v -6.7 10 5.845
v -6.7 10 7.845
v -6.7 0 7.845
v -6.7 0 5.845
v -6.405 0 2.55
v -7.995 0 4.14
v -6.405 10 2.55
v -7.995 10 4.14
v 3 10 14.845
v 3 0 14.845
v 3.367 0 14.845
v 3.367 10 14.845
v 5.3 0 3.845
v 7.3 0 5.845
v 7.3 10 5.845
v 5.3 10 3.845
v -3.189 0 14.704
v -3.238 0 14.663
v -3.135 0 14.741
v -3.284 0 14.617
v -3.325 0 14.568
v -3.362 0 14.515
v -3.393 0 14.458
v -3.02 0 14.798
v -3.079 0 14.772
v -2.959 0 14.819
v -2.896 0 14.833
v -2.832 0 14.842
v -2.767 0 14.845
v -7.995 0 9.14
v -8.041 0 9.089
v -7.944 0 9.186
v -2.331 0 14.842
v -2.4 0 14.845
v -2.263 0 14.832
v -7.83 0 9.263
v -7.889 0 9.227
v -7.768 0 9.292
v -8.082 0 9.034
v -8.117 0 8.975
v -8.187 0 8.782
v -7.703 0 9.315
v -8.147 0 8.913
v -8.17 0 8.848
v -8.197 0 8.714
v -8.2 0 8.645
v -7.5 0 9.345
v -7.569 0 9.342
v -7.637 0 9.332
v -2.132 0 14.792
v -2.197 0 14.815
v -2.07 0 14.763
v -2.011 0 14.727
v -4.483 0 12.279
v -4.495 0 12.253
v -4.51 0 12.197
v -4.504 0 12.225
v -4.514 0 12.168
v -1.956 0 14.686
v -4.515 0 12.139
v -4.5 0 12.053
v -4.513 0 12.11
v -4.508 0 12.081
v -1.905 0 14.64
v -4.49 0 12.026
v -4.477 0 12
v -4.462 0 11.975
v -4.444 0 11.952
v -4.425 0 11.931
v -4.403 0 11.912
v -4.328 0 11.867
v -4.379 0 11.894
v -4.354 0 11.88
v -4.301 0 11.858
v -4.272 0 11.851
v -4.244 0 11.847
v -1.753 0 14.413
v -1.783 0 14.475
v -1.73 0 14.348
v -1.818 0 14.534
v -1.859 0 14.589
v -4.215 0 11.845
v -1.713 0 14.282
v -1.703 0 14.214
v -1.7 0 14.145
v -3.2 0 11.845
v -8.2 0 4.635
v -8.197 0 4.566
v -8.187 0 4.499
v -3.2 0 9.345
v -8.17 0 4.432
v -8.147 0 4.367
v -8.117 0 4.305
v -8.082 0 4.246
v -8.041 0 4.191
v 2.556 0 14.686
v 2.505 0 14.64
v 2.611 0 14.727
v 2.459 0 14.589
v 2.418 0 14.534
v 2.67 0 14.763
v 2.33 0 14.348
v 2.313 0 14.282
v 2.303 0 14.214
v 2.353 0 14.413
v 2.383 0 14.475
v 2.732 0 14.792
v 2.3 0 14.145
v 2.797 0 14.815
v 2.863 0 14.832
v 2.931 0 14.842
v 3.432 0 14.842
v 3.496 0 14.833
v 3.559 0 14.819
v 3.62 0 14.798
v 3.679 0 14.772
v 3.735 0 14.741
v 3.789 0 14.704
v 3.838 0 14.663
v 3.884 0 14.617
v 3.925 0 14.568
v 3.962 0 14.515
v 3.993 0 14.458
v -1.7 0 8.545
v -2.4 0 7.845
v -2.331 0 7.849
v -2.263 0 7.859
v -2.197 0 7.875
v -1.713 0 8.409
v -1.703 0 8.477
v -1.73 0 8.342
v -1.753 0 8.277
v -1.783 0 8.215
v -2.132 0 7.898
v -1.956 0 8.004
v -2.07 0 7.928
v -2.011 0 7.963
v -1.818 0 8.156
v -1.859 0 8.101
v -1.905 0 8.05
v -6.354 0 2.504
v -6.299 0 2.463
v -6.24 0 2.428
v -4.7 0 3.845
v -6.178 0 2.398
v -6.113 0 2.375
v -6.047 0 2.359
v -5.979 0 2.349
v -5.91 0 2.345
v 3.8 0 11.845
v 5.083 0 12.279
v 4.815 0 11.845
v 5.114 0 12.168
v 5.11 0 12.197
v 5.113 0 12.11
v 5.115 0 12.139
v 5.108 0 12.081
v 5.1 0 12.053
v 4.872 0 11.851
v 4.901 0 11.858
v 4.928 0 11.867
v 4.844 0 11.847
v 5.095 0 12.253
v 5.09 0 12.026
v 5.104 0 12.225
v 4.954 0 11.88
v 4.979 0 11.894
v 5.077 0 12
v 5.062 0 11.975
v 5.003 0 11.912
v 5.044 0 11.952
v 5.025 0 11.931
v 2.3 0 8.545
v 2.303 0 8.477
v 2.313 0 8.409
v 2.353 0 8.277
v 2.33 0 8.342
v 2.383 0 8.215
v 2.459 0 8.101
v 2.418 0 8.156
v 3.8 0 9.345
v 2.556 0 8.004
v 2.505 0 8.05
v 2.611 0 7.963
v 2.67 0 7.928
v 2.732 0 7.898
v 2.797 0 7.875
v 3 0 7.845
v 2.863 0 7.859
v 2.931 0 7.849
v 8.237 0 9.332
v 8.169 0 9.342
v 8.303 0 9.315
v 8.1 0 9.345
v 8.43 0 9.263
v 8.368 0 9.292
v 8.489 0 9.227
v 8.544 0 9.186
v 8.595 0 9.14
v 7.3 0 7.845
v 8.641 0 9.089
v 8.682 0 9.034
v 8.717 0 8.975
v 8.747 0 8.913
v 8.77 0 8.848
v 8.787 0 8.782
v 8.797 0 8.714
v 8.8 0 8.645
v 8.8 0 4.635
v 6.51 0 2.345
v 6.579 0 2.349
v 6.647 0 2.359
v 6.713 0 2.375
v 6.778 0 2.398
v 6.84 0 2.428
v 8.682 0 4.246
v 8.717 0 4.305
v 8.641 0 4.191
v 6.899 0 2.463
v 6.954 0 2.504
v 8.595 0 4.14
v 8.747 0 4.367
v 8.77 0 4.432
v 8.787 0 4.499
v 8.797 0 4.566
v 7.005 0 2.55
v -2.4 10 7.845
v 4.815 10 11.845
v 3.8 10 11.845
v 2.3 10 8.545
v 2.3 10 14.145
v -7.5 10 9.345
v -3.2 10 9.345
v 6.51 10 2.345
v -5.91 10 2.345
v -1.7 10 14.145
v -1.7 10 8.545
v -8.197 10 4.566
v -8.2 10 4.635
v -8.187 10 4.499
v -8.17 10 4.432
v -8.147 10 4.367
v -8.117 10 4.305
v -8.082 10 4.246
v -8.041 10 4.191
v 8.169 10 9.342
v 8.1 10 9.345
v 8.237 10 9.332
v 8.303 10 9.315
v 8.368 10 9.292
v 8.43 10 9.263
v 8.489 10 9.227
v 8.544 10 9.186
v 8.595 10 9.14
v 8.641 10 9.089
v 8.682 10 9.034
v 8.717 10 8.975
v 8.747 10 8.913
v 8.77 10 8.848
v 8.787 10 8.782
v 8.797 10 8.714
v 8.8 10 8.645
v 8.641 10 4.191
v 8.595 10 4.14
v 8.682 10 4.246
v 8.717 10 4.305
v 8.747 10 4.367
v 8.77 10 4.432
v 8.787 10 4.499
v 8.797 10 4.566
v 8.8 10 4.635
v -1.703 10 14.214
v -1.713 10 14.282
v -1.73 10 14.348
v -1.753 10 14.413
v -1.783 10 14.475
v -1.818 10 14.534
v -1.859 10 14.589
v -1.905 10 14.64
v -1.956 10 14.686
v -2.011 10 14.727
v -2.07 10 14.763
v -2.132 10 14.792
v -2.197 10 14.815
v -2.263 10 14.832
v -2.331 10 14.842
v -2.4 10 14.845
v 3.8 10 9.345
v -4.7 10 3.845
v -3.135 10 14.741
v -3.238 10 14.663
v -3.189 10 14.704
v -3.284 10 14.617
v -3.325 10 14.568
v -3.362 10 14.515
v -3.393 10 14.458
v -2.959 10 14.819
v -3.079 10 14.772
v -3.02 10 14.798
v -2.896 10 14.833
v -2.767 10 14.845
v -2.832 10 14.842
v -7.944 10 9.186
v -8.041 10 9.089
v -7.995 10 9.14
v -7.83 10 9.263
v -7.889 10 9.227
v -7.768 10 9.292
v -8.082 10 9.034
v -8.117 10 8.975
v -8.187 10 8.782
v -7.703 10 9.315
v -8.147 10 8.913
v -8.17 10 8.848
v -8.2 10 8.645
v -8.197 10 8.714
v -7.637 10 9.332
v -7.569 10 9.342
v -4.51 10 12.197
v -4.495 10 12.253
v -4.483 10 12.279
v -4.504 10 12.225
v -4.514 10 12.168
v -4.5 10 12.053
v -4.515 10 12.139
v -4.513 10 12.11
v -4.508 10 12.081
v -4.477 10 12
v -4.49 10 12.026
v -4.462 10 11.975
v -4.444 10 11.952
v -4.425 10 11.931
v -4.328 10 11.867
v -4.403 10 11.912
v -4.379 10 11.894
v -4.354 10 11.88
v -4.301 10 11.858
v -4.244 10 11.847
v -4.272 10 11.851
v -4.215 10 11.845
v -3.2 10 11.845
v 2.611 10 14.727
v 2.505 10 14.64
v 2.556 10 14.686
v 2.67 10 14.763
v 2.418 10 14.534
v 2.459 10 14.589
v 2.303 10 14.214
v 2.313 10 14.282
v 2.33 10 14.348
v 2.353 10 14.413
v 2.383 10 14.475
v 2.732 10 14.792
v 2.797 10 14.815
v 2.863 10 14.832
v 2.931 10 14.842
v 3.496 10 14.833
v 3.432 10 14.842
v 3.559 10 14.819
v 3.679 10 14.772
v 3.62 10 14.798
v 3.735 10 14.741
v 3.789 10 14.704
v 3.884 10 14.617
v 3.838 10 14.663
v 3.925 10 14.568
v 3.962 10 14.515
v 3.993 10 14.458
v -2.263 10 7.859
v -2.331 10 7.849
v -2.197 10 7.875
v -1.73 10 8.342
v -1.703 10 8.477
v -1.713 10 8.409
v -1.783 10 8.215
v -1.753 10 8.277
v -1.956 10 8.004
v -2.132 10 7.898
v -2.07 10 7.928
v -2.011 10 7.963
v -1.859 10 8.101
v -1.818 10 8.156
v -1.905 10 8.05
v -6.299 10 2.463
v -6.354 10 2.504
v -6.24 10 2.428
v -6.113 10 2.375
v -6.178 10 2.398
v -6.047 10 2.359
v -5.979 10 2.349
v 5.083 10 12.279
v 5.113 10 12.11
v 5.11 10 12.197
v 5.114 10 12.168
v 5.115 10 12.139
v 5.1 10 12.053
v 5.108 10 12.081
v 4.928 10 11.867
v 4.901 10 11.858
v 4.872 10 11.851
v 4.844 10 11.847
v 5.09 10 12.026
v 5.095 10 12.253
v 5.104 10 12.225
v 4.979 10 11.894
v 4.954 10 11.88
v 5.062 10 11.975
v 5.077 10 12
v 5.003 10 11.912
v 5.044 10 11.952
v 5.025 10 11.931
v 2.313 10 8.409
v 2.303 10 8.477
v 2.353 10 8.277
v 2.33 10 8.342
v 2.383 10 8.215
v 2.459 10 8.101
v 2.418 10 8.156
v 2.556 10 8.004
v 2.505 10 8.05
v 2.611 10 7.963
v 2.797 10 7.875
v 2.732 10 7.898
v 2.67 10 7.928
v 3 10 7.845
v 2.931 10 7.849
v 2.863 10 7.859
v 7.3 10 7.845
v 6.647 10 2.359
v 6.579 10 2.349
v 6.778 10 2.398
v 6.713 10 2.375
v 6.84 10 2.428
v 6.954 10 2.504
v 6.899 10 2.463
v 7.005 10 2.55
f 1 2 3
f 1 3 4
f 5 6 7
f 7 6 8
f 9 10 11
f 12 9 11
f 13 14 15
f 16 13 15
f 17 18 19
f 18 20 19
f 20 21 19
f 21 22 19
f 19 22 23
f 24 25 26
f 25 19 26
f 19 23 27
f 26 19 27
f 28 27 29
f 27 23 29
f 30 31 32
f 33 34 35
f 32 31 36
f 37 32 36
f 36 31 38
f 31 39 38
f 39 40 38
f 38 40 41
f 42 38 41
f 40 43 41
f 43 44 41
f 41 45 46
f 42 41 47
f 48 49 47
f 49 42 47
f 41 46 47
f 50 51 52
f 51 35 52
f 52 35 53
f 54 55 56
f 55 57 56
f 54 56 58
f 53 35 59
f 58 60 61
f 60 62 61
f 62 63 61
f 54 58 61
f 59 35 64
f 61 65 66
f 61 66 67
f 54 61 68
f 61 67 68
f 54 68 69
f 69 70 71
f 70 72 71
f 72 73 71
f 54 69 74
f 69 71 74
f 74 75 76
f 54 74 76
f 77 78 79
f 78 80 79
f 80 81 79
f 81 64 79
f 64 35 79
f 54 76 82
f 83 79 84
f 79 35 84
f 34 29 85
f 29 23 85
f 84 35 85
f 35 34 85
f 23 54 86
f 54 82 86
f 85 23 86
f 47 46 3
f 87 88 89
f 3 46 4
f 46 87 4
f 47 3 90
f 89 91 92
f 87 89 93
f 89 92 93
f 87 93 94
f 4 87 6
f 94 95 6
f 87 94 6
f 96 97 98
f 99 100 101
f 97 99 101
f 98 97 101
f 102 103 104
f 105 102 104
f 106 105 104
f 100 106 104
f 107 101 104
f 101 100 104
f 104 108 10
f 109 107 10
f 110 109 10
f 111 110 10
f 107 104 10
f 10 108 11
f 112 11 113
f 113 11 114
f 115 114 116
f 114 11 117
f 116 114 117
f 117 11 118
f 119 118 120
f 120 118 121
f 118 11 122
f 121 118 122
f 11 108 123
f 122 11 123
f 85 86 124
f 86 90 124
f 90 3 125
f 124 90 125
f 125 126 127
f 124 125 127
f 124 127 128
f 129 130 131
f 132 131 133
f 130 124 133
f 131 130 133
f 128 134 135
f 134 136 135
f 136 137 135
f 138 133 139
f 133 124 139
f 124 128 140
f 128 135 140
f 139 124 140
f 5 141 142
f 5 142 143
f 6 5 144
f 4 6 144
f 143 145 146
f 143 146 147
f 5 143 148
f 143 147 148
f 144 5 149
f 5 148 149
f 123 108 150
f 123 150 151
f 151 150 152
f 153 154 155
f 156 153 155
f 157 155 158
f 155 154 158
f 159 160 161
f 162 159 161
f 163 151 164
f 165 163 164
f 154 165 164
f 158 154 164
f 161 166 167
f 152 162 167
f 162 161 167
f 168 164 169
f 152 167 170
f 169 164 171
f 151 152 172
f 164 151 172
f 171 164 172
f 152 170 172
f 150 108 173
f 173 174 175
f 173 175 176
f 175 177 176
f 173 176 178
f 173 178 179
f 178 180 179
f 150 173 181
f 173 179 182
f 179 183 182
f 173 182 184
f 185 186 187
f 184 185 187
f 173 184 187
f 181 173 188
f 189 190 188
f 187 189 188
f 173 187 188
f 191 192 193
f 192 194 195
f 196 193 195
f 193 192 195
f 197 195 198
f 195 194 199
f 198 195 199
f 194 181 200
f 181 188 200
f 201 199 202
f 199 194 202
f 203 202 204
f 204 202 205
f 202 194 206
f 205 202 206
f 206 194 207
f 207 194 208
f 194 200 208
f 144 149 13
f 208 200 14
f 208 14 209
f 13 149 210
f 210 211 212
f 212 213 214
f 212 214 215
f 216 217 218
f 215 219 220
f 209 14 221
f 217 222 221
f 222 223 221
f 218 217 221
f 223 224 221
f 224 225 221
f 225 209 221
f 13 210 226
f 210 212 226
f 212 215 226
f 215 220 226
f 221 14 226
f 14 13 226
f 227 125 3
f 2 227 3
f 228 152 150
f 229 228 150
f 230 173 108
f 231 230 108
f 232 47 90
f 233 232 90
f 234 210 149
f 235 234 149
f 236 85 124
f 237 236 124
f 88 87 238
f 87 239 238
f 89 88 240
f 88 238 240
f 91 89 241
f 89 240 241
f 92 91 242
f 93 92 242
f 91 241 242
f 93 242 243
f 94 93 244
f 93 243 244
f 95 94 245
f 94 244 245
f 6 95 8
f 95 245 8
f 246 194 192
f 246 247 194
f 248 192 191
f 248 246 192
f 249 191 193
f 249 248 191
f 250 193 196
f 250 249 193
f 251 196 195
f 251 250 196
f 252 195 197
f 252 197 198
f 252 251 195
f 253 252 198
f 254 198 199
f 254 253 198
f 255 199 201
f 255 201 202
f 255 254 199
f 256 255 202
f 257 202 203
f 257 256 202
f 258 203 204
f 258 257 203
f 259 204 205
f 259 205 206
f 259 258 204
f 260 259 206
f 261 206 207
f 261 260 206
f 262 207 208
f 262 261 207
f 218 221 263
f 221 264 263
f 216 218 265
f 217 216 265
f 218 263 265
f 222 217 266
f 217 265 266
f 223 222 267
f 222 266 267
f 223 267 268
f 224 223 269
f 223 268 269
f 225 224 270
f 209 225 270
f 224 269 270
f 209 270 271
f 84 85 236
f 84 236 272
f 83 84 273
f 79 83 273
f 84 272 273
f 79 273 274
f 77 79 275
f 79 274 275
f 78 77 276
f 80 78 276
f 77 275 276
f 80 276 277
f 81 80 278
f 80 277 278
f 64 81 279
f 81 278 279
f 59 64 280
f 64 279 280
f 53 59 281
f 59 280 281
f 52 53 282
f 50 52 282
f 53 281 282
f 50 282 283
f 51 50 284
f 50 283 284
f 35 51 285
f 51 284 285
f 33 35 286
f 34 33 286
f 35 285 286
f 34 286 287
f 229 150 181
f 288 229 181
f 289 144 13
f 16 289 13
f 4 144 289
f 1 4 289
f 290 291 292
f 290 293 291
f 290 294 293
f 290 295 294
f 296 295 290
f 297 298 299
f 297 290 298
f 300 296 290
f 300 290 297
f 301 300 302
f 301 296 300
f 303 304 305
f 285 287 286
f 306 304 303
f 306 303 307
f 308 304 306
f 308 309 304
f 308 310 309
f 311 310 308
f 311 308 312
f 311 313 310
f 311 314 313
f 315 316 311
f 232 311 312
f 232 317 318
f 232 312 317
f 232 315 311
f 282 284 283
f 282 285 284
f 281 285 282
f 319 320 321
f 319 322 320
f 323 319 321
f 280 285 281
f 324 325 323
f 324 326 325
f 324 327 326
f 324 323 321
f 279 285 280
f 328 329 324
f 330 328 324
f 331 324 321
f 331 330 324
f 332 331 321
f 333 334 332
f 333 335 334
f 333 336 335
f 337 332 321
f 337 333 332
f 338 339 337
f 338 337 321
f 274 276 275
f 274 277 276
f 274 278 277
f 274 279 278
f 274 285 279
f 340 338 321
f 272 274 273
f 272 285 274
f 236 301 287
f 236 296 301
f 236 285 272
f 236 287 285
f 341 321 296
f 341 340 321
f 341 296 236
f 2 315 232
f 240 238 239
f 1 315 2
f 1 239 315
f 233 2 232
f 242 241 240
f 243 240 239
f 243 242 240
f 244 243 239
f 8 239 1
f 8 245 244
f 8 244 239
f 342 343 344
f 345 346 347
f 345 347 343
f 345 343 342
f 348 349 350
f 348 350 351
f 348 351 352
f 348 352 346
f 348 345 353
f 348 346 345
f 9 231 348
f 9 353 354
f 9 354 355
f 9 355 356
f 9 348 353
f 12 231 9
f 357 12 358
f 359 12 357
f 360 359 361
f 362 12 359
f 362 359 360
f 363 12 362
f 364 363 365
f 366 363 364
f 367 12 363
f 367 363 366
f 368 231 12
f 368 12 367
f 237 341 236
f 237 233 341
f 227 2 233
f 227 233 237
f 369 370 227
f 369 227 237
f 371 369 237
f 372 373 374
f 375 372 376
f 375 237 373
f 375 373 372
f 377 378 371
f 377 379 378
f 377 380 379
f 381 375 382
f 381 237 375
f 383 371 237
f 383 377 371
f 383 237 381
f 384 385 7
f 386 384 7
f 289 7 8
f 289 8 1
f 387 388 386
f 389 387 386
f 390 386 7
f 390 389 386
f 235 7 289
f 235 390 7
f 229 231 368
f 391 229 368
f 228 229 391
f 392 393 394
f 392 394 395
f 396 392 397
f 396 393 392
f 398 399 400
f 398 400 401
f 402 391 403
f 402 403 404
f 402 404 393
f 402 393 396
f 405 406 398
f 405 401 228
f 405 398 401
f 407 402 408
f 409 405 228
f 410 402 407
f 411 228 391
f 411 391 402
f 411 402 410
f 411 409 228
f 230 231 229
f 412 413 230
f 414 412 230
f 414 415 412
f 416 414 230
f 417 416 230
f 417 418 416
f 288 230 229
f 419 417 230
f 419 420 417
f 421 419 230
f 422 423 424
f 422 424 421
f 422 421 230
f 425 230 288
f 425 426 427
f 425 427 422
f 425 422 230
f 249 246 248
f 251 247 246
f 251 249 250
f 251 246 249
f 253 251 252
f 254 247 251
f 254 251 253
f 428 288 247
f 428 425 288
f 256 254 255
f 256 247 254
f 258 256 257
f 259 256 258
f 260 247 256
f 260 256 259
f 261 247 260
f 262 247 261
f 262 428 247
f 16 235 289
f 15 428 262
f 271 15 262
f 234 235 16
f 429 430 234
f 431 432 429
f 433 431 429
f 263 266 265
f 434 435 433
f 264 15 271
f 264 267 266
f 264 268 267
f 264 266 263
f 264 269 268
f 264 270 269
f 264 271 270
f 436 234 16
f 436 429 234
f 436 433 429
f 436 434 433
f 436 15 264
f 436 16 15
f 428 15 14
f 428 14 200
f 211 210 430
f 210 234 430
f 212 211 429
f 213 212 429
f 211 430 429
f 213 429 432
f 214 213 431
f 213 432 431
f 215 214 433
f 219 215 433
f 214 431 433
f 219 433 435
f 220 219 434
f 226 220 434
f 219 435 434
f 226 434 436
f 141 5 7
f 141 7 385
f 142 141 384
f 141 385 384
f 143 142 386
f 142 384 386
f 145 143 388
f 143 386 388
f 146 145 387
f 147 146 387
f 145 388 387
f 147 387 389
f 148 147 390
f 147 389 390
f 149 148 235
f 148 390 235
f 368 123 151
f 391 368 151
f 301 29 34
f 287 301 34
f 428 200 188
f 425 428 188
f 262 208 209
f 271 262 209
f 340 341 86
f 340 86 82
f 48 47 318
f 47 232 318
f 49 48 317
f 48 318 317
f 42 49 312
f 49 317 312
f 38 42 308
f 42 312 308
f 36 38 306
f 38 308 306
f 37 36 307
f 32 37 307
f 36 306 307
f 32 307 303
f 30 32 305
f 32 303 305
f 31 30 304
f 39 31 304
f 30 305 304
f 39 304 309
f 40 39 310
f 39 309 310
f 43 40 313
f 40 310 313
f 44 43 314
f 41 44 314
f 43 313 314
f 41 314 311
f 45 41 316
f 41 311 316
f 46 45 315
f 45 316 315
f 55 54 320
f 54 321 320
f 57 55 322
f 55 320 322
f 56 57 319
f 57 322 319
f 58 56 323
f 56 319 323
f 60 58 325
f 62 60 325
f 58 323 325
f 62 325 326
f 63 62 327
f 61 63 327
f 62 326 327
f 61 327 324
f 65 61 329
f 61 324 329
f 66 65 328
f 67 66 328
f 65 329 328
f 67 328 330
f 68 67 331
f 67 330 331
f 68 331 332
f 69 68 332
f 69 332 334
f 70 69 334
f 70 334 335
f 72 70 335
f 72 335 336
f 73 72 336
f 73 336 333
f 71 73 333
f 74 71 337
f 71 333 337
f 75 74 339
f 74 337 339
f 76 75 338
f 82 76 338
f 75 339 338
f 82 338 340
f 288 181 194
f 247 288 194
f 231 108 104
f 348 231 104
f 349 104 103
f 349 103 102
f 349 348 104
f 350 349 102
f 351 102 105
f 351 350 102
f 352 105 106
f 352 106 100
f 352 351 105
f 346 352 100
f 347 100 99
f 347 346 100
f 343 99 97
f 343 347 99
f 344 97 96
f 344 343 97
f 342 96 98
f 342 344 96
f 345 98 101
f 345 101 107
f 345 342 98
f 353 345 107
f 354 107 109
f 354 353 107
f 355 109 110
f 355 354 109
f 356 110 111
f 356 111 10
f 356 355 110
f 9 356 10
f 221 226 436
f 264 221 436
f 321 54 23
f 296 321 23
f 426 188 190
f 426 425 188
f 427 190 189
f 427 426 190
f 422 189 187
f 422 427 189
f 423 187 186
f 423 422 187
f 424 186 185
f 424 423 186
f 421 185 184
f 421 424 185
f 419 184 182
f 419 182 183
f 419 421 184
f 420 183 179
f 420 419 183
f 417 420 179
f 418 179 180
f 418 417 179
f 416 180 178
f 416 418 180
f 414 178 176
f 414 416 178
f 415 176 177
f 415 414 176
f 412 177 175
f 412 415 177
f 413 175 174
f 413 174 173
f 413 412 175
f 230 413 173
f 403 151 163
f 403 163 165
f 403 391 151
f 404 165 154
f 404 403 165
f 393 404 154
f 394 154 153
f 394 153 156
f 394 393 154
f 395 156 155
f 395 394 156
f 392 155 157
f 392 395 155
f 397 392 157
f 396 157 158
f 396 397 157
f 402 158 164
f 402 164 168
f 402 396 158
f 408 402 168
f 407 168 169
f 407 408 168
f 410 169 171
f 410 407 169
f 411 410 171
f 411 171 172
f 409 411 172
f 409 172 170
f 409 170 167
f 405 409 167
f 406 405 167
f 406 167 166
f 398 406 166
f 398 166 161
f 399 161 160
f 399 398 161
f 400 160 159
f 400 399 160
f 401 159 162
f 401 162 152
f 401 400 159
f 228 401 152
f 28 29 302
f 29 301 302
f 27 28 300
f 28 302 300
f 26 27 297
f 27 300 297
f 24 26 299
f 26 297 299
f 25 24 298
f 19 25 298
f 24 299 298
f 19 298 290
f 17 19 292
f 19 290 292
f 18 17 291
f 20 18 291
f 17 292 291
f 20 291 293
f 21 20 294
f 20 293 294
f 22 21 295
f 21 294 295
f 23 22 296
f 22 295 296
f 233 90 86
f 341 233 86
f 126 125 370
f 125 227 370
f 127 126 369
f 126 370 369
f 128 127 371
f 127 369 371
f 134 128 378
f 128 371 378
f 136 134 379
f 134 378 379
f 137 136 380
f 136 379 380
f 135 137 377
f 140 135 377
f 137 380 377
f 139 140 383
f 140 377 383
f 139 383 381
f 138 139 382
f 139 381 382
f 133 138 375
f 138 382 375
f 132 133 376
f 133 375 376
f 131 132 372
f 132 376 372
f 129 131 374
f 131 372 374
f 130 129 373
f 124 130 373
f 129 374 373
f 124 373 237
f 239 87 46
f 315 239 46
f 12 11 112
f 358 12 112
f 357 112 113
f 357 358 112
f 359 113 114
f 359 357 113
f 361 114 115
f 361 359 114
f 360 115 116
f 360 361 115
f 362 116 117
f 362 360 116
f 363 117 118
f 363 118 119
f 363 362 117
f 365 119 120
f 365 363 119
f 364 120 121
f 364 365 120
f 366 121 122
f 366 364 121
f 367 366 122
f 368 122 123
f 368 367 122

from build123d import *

# Parameters (mm, degrees)
BOSS_EXTRUDE1_DEPTH = 10
CHAMFER1_SIZE       = 2
FILLET1_R           = 0.7
FILLET2_R           = 0.3


with BuildPart() as part:
    # Sketch1 → Boss-Extrude1 (new body)
    with BuildSketch(Plane(origin=(0, 0, 0), x_dir=(1, 0, 0), z_dir=(0, 1, 0))):
        Polygon((-1.7, -14.845158122), (-1.7, -7.845158122), (-6.7, -7.845158122), (-6.7, -3.845158122), (7.3, -3.845158122), (7.3, -7.845158122), (2.3, -7.845158122), (2.3, -14.845158122), (3.8, -14.845158122), (5.3, -11.845158122), (3.8, -11.845158122), (3.8, -9.345158122), (8.8, -9.345158122), (8.8, -2.345158122), (-8.2, -2.345158122), (-8.2, -9.345158122), (-3.2, -9.345158122), (-3.2, -11.845158122), (-4.7, -11.845158122), (-3.2, -14.845158122), align=None)
    extrude(amount=BOSS_EXTRUDE1_DEPTH)

    # Chamfer1
    chamfer1_edges = [part.edges().sort_by_distance(p)[0] for p in [
        (-8.2, 5, 2.345158122),
        (8.8, 5, 2.345158122),
        (7.3, 5, 3.845158122),
        (-6.7, 5, 3.845158122),
    ]]
    chamfer(chamfer1_edges, length=CHAMFER1_SIZE)

    # Fillet1
    fillet1_edges = [part.edges().sort_by_distance(p)[0] for p in [
        (-1.7, 5, 14.845158122),
        (-3.2, 5, 14.845158122),
        (-8.2, 5, 9.345158122),
        (8.8, 5, 9.345158122),
        (3.8, 5, 14.845158122),
        (2.3, 5, 14.845158122),
        (2.3, 5, 7.845158122),
        (-1.7, 5, 7.845158122),
        (-8.2, 5, 4.345158122),
        (6.8, 5, 2.345158122),
        (-6.2, 5, 2.345158122),
        (8.8, 5, 4.345158122),
    ]]
    fillet(fillet1_edges, radius=FILLET1_R)

    # Fillet2
    fillet2_edges = [part.edges().sort_by_distance(p)[0] for p in [
        (-4.7, 5, 11.845158122),
        (5.3, 5, 11.845158122),
    ]]
    fillet(fillet2_edges, radius=FILLET2_R)


solid = part.part
